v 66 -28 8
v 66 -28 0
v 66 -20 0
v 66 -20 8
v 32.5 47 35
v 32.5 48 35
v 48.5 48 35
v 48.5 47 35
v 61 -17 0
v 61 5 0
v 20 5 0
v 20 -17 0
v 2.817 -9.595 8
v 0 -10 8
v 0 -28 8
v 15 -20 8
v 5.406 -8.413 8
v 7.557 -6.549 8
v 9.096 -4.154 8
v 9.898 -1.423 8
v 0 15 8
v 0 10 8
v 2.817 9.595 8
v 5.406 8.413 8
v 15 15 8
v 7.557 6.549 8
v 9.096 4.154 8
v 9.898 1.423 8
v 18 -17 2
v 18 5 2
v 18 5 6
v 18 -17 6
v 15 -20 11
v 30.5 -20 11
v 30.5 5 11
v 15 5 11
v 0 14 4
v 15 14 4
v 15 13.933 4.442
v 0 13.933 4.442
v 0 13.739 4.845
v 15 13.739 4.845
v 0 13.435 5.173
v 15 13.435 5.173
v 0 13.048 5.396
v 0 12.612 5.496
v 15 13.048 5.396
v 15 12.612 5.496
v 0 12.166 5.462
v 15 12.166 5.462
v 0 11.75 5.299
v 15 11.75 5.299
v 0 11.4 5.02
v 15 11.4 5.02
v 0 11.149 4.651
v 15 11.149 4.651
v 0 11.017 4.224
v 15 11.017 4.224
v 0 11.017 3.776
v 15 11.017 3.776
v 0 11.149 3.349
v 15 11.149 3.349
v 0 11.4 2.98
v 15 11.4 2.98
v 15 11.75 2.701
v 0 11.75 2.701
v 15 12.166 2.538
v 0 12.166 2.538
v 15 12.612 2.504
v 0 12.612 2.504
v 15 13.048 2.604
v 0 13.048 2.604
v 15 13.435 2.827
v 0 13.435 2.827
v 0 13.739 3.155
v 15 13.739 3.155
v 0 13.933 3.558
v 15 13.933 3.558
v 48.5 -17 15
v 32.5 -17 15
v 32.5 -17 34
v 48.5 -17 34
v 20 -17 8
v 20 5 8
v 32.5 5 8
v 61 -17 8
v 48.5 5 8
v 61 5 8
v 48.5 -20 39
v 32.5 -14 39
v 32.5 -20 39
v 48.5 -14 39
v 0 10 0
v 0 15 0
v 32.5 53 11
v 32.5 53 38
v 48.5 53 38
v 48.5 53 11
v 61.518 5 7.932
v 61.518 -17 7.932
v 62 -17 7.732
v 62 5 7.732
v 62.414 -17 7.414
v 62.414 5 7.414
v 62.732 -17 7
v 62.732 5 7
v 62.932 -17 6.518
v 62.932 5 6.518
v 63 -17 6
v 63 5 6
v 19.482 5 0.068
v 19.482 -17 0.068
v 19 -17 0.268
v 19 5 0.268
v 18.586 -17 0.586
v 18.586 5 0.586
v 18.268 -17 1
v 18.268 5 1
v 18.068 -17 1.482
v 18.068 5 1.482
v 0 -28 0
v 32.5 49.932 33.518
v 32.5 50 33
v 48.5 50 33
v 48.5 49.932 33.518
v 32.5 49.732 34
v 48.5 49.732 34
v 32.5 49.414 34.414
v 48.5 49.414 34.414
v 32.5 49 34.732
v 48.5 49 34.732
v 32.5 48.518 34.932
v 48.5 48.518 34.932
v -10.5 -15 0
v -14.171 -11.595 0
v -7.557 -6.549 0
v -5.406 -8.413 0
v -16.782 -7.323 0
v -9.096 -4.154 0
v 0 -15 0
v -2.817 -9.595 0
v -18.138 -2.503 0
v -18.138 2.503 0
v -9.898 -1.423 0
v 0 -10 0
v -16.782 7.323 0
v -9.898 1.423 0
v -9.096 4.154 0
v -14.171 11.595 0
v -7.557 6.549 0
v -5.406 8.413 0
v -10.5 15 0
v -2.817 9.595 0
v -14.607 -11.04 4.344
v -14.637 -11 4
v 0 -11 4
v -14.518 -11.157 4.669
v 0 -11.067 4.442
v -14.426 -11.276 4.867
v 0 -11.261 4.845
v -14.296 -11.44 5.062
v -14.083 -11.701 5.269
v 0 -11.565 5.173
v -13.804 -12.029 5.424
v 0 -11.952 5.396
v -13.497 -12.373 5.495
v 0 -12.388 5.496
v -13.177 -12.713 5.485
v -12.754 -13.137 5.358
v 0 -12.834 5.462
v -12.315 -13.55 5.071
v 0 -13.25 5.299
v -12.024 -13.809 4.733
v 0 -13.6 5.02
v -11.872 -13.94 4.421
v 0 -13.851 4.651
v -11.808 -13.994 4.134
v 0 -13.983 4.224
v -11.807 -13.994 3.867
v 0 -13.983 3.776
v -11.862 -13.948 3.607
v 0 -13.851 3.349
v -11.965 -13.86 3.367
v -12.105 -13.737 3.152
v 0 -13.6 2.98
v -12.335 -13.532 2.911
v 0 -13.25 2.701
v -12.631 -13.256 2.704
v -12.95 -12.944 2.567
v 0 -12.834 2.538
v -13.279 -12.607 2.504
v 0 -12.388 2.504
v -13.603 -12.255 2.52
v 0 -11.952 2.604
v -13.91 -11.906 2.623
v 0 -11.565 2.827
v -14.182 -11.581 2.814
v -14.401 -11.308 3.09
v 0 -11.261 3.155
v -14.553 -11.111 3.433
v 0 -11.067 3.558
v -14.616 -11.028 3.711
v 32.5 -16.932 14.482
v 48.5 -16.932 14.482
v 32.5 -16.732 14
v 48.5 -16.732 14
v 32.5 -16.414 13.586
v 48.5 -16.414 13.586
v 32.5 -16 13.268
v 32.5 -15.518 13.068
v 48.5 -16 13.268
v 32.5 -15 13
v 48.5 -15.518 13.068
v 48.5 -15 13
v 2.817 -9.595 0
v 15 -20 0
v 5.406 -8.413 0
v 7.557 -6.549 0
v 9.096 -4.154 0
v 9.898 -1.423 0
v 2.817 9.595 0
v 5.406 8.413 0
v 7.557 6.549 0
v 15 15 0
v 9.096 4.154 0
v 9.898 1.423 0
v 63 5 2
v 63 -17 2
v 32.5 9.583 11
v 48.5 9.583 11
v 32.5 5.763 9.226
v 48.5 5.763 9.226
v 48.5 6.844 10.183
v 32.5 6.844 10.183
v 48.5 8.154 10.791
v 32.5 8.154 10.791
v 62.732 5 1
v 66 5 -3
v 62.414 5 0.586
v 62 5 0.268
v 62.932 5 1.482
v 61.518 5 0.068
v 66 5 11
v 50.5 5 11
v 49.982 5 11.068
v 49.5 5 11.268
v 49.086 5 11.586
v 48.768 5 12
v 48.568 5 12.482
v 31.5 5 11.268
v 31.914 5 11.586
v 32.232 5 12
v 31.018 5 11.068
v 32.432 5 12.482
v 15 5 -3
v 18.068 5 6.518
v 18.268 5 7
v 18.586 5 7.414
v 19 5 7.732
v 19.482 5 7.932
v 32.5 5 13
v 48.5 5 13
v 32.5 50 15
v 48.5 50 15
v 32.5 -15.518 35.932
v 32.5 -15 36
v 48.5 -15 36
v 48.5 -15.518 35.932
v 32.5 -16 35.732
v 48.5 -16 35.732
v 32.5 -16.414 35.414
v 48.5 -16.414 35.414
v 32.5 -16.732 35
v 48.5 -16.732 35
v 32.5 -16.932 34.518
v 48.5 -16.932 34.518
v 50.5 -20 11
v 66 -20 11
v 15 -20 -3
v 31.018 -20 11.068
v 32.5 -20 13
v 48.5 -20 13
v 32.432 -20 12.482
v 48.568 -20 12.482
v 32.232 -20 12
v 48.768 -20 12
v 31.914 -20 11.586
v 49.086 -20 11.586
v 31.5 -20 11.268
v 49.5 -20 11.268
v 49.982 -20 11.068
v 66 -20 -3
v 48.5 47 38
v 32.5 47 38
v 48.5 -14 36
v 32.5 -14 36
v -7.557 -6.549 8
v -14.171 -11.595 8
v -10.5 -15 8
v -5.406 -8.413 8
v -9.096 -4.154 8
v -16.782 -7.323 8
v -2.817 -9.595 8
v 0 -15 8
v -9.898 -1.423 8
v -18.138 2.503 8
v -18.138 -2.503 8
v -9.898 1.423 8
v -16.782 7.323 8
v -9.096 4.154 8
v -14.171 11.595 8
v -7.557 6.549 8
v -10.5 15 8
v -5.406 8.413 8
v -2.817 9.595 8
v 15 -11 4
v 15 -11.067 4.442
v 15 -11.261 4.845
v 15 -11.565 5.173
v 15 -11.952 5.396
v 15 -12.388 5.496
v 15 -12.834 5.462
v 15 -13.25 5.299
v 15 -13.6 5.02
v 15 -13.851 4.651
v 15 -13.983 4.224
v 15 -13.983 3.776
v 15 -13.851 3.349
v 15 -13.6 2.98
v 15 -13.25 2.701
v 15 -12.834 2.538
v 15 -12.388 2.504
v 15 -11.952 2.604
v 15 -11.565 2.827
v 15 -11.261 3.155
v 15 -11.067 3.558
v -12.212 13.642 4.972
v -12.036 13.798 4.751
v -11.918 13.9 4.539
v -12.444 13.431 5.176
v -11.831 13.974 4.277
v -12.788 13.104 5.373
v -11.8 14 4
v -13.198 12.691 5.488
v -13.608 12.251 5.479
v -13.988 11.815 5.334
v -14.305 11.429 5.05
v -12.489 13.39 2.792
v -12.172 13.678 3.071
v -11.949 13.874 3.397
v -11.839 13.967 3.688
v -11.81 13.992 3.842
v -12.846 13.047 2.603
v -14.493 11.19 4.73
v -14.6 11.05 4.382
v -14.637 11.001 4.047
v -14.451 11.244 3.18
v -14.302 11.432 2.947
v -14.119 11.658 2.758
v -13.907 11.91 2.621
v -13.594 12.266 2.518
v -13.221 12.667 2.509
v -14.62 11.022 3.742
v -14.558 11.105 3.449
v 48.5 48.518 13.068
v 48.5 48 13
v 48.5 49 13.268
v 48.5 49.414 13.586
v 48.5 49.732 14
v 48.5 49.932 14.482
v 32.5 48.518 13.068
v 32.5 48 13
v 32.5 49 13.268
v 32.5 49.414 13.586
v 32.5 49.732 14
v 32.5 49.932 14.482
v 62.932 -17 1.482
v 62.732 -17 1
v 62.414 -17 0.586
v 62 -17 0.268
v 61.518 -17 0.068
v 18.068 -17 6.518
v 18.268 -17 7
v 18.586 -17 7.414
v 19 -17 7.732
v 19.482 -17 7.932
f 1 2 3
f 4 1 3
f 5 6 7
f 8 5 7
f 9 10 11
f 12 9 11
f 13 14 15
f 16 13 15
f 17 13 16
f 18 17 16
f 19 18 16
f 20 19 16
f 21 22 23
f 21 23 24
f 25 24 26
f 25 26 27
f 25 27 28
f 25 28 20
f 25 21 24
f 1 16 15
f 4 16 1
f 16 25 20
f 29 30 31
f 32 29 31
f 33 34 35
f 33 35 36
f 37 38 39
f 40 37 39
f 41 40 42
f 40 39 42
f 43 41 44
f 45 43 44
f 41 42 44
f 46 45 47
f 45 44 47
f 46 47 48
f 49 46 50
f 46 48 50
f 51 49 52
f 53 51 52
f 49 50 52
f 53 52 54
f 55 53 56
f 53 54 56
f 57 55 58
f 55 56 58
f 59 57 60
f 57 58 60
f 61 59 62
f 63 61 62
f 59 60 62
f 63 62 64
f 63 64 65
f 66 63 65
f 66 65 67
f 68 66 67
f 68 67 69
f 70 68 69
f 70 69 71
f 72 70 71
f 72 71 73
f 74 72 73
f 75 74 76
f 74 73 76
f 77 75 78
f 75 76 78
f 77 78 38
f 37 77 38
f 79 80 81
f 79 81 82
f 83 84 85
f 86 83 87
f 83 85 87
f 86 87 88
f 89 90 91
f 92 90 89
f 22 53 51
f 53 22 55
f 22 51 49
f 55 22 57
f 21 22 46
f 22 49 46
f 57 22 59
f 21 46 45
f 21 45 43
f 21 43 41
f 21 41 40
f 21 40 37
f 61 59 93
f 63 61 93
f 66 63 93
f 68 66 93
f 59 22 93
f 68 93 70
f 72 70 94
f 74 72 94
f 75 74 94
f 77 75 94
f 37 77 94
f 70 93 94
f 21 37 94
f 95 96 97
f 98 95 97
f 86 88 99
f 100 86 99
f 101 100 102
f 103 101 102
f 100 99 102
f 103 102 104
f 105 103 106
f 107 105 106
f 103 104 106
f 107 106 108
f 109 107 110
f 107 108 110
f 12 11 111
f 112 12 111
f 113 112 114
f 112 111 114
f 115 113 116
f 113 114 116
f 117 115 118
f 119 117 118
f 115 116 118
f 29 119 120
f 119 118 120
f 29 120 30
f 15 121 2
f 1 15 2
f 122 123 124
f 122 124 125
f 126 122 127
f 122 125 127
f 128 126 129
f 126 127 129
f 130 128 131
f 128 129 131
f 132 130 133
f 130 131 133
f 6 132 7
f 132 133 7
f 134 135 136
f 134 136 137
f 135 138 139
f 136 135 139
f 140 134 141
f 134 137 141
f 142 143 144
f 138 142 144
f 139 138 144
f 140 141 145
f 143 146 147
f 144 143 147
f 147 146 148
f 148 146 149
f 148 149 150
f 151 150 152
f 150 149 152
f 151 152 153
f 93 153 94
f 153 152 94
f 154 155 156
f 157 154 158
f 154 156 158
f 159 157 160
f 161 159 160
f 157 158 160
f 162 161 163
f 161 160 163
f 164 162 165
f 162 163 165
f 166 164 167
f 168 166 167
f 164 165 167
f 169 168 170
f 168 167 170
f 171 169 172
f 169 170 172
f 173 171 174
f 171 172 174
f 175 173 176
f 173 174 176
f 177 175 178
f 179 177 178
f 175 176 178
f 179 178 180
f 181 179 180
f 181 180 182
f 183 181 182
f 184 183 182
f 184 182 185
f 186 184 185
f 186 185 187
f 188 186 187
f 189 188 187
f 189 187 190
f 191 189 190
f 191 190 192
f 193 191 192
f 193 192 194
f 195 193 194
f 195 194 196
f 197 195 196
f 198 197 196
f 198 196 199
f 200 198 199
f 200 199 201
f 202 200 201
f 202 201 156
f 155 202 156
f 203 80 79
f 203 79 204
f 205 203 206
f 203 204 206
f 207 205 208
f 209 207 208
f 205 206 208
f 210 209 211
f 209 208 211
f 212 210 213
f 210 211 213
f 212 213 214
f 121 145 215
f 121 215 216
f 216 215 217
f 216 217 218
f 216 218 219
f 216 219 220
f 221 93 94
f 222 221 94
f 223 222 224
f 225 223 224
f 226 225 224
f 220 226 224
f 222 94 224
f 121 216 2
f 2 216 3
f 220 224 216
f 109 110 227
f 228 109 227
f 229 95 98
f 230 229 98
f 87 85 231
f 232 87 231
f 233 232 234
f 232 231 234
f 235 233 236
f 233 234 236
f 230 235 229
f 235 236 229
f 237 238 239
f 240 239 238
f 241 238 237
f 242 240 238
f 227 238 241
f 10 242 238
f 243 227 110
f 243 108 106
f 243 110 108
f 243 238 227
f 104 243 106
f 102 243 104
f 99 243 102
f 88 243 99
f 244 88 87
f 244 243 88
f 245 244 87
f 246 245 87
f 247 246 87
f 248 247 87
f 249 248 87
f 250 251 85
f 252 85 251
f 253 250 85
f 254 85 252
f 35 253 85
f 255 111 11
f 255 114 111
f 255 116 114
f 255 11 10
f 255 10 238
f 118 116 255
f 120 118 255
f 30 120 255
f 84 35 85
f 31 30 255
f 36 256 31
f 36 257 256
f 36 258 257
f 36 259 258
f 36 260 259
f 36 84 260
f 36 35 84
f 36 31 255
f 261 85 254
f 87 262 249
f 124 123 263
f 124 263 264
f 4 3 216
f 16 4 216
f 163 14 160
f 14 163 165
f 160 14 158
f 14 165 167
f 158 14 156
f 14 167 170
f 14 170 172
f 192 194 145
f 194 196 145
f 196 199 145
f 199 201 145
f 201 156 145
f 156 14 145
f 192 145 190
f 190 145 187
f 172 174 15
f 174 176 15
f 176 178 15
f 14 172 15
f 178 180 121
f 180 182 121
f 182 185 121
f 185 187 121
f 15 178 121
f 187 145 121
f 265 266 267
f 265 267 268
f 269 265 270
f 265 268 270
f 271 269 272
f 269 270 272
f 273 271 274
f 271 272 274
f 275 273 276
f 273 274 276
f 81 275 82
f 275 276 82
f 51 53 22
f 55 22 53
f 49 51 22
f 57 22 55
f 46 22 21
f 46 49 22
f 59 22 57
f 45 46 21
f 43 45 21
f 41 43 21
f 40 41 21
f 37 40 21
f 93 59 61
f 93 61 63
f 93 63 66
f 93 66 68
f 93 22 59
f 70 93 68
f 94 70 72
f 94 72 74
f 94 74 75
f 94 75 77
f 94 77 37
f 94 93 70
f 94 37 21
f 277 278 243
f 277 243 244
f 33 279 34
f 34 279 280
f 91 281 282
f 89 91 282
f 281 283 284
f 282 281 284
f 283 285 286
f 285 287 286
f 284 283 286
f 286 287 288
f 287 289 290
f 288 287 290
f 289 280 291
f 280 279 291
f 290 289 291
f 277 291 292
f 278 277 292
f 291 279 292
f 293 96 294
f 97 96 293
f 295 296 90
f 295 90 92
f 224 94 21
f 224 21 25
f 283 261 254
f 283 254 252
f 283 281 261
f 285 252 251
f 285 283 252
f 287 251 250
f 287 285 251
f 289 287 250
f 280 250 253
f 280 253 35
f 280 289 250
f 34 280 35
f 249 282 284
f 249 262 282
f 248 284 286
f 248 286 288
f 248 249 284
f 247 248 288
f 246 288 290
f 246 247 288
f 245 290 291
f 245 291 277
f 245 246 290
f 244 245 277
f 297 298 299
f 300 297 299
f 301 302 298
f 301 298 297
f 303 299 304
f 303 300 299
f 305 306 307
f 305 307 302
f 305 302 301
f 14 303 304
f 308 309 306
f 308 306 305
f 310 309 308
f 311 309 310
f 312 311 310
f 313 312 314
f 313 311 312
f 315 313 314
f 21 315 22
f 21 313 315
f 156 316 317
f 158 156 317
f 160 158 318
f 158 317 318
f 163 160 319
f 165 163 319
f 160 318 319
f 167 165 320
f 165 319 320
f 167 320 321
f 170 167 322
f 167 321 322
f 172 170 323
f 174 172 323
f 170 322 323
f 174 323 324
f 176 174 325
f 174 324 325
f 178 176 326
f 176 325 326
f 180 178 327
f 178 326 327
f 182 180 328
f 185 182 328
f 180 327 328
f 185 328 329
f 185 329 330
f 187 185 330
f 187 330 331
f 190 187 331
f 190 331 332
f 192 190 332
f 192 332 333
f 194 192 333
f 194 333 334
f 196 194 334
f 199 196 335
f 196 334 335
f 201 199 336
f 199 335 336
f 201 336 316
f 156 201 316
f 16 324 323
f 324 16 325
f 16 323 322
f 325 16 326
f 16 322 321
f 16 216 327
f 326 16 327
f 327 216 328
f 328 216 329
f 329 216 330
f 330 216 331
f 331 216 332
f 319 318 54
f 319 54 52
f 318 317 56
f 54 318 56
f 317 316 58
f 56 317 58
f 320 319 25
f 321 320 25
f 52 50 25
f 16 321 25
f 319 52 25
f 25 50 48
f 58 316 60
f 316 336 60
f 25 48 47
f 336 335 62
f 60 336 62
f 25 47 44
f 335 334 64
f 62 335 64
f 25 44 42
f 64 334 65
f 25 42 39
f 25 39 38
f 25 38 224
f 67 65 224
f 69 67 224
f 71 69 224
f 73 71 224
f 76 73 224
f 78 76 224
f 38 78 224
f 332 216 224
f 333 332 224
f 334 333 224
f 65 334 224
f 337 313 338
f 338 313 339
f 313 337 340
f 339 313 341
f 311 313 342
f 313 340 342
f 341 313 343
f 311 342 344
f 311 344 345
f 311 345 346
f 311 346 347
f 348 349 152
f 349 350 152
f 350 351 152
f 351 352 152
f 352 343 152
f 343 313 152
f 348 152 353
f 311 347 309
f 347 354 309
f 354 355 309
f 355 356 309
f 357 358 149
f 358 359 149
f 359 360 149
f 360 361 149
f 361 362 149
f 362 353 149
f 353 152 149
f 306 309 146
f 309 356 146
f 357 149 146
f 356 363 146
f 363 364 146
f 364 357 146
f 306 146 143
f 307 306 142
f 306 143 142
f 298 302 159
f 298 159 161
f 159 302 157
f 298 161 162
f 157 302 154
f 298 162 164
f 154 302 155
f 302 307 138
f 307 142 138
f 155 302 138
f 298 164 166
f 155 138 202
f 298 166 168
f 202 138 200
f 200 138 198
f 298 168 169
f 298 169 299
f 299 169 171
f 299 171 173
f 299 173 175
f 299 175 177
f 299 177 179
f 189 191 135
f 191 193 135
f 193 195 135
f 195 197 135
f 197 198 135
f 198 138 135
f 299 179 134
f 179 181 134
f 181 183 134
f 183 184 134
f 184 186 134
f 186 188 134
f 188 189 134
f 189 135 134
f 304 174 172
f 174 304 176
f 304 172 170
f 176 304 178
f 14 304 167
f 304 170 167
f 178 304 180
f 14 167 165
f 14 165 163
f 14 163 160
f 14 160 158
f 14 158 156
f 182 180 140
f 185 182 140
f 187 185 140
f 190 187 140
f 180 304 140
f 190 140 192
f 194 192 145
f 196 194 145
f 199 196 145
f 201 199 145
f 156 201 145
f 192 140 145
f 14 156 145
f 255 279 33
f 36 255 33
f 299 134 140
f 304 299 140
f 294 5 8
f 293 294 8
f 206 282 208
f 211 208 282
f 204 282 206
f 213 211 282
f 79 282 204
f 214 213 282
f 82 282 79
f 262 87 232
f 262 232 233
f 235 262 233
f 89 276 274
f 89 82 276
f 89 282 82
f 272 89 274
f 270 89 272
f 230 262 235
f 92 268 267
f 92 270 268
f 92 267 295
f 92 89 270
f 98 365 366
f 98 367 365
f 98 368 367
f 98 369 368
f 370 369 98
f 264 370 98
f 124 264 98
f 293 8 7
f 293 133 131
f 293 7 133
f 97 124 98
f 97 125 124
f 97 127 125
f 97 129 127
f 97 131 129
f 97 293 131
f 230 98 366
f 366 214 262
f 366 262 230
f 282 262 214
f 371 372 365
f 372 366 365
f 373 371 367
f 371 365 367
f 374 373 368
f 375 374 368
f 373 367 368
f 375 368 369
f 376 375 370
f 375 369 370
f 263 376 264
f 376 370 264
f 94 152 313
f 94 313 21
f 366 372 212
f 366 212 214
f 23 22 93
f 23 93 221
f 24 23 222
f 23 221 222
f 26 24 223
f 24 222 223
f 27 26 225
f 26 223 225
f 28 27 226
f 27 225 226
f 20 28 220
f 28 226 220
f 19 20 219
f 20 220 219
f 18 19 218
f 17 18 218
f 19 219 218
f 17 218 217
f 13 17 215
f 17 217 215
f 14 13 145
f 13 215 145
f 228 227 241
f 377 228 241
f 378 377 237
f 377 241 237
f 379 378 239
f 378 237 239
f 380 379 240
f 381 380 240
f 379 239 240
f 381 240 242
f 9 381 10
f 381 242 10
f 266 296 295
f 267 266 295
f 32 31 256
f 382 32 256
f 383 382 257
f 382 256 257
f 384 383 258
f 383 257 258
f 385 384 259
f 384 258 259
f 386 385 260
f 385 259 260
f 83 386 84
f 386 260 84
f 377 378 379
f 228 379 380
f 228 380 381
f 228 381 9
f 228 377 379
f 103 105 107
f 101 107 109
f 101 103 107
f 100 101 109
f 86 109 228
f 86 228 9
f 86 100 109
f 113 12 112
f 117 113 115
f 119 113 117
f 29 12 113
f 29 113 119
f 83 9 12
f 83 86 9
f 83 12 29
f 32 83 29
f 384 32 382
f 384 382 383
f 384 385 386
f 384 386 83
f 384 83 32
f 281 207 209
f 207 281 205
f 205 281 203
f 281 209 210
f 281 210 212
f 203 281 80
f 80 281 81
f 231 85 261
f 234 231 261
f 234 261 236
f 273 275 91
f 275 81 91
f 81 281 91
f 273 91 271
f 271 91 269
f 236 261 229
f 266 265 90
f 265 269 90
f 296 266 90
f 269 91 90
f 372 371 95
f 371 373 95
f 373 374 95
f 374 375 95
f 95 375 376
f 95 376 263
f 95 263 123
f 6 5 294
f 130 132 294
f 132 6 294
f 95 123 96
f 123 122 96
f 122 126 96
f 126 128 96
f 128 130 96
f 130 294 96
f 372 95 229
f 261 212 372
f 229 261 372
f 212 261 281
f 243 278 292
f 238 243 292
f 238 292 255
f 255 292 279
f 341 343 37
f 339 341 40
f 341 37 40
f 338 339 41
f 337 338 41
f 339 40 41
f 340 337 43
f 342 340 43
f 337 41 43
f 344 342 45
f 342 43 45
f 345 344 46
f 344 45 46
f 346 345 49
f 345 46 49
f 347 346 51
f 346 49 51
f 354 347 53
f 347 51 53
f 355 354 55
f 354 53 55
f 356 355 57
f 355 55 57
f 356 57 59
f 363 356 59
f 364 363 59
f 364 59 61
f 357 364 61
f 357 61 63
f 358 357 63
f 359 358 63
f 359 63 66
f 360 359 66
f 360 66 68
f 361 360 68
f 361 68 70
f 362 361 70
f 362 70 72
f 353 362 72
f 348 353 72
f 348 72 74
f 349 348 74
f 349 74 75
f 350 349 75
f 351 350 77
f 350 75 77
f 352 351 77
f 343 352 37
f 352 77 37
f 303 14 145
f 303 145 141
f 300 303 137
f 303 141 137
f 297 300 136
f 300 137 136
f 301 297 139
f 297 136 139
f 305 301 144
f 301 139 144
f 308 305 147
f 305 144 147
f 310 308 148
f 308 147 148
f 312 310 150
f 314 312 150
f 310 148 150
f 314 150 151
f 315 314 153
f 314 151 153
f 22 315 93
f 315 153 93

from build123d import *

# Parameters (mm, degrees)
F0_W         = 10.5
F0_H         = 5
F1_DEPTH     = 8
F2_R         = 1.5
F3_DEPTH     = 14.6382812683
F4_W         = 15
F4_H         = 5
F5_DEPTH     = 8
F6_R         = 1.5
F7_DEPTH     = 15
F8_W         = 51
F8_H         = 3
F8_H_2       = 8
F9_DEPTH     = 25
F11_DEPTH    = 22
F12_W        = 16
F12_H        = 48
F12_H_2      = 25
F13_DEPTH    = 2
F14_W        = 16
F14_H        = 3
F15_DEPTH    = 22
F16_W        = 16
F16_H        = 3
F17_DEPTH    = 3
F18_W        = 16
F18_H        = 3
F19_DEPTH    = 23
F20_W        = 16
F20_H        = 3
F21_DEPTH    = 3
F22_R        = 1.9999
F24_T1_DEPTH = 16


# Not quite as in the source:
# - a fillet or chamfer that OpenCascade refuses, or shapes differently, is made with other operations: its cross-section is extruded or revolved along the edge and cut away or added
# - two fillets or chamfers of one size are made in one step
# - a fillet or chamfer is up to 0.001 mm smaller than in the source, because OpenCascade refuses the exact size
# - a feature names something its author has since deleted; it is built from what else it names


with BuildPart() as f1:
    # F0 (on Top) → F1 (new body)
    with BuildSketch(Plane.XY):
        with Locations((-5.25, 12.5)):
            Rectangle(F0_W, F0_H)
        with BuildLine():
            ThreePointArc((0, -10), (-10, 0), (0, 10))
            Line((0, 10), (-10.5, 10))
            Line((-10.5, 10), (-10.5, 15))
            ThreePointArc((-10.5, 15), (-18.3098334236, 0), (-10.5, -15))
            Line((-10.5, -15), (-10.5, -10))
            Line((-10.5, -10), (0, -10))
        make_face()
        with Locations((-5.25, -12.5)):
            Rectangle(F0_W, F0_H)
    extrude(amount=F1_DEPTH)

    # F2 (on face) → F3 (cut, through all)
    with BuildSketch(Plane.YZ):
        with Locations((12.5, 4)):
            Circle(F2_R)
        with Locations((-12.5, 4)):
            Circle(F2_R)
    extrude(amount=-F3_DEPTH, mode=Mode.SUBTRACT)


with BuildPart() as f5:
    # F4 (on Top) → F5 (new body)
    with BuildSketch(Plane.XY):
        with BuildLine():
            Line((15, 10), (0, 10))
            ThreePointArc((0, 10), (10, 0), (0, -10))
            Line((0, -10), (15, -10))
            Line((15, -10), (15, 10))
        make_face()
        with Locations((7.5, 12.5)):
            Rectangle(F4_W, F4_H)
        with Locations((7.5, -12.5)):
            Rectangle(F4_W, F4_H)
        with Locations((7.5, -17.5)):
            Rectangle(F4_W, F4_H)
        Polygon((15, -20), (0, -20), (0, -28), (66, -28), (66, -20), align=None)
    extrude(amount=F5_DEPTH)

    # F6 (on face) → F7 (cut, through all)
    with BuildSketch(Plane.YZ.offset(15)):
        with Locations((-12.5, 4)):
            Circle(F6_R)
        with Locations((12.5, 4)):
            Circle(F6_R)
    extrude(amount=-F7_DEPTH, mode=Mode.SUBTRACT)


with BuildPart() as f9:
    # F8 (on face) → F9 (new body)
    with BuildSketch(Plane(origin=(0, -20, 0), x_dir=(-1, 0, 0), z_dir=(0, 1, 0))):
        with Locations((-40.5, 9.5)):
            Rectangle(F8_W, F8_H)
        with Locations((-40.5, 4)):
            Rectangle(F8_W, F8_H_2)
        with Locations((-40.5, -1.5)):
            Rectangle(F8_W, F8_H)
    extrude(amount=F9_DEPTH)

    # F10 (on face) → F11 (cut)
    with BuildSketch(Plane(origin=(0, 5, 0), x_dir=(-1, 0, 0), z_dir=(0, 1, 0))):
        with BuildLine():
            Line((-17.9999992251, 1.9999992251), (-17.9999992251, 6.0000007749))
            ThreePointArc((-17.9999992251, 6.0000007749), (-18.5857856628, 7.4142143372), (-19.9999992251, 8.0000007749))
            Line((-19.9999992251, 8.0000007749), (-61.0000007749, 8.0000007749))
            ThreePointArc((-61.0000007749, 8.0000007749), (-62.4142143372, 7.4142143372), (-63.0000007749, 6.0000007749))
            Line((-63.0000007749, 6.0000007749), (-63.0000007749, 1.9999992251))
            ThreePointArc((-63.0000007749, 1.9999992251), (-62.4142143372, 0.5857856628), (-61.0000007749, -7.749e-07))
            Line((-61.0000007749, -7.749e-07), (-19.9999992251, -7.749e-07))
            ThreePointArc((-19.9999992251, -7.749e-07), (-18.5857856628, 0.5857856628), (-17.9999992251, 1.9999992251))
        make_face()
    extrude(amount=-F11_DEPTH, mode=Mode.SUBTRACT)

    # F12 (on face) → F13 (join)
    with BuildSketch(Plane.XY.offset(11)):
        with Locations((40.5, 29)):
            Rectangle(F12_W, F12_H)
        with Locations((40.5, -7.5)):
            Rectangle(F12_W, F12_H_2)
    extrude(amount=F13_DEPTH)

    # F14 (on face) → F15 (join)
    with BuildSketch(Plane.XY.offset(13)):
        with Locations((40.5, 51.5)):
            Rectangle(F14_W, F14_H)
    extrude(amount=F15_DEPTH)

    # F16 (on face) → F17 (join)
    with BuildSketch(Plane.XY.offset(35)):
        with Locations((40.5, 48.5)):
            Rectangle(F16_W, F16_H)
        with Locations((40.5, 51.5)):
            Rectangle(F16_W, F16_H)
    extrude(amount=F17_DEPTH)

    # F18 (on face) → F19 (join)
    with BuildSketch(Plane.XY.offset(13)):
        with Locations((40.5, -18.5)):
            Rectangle(F18_W, F18_H)
    extrude(amount=F19_DEPTH)

    # F20 (on face) → F21 (join)
    with BuildSketch(Plane.XY.offset(36)):
        with Locations((40.5, -15.5)):
            Rectangle(F20_W, F20_H)
        with Locations((40.5, -18.5)):
            Rectangle(F20_W, F20_H)
    extrude(amount=F21_DEPTH)

    # F22 (radius 2 in the source; OpenCascade refuses exactly that, so slightly less here)
    f22_edges = [f9.edges().sort_by_distance(p)[0] for p in [
        (32.5, -7.5, 11),
        (48.5, -7.5, 11),
        (40.5, 50, 35),
        (40.5, 50, 13),
        (40.5, -17, 13),
        (40.5, -17, 36),
    ]]
    fillet(f22_edges, radius=F22_R)

    # F24: fillet of radius 5 on 1 edges, made by hand

    # F24_s2 → F24_t1 (join)
    with BuildSketch(Plane.YZ.offset(32.5)):
        with BuildLine():
            ThreePointArc((5, 8.0000007749), (6.8439629229, 10.1833003642), (9.5825753568, 11))
            Line((9.5825753568, 11), (5, 11))
            Line((5, 11), (5, 8.0000007749))
        make_face()
    extrude(amount=F24_T1_DEPTH)


solid = Compound([f1.part, f5.part, f9.part])
